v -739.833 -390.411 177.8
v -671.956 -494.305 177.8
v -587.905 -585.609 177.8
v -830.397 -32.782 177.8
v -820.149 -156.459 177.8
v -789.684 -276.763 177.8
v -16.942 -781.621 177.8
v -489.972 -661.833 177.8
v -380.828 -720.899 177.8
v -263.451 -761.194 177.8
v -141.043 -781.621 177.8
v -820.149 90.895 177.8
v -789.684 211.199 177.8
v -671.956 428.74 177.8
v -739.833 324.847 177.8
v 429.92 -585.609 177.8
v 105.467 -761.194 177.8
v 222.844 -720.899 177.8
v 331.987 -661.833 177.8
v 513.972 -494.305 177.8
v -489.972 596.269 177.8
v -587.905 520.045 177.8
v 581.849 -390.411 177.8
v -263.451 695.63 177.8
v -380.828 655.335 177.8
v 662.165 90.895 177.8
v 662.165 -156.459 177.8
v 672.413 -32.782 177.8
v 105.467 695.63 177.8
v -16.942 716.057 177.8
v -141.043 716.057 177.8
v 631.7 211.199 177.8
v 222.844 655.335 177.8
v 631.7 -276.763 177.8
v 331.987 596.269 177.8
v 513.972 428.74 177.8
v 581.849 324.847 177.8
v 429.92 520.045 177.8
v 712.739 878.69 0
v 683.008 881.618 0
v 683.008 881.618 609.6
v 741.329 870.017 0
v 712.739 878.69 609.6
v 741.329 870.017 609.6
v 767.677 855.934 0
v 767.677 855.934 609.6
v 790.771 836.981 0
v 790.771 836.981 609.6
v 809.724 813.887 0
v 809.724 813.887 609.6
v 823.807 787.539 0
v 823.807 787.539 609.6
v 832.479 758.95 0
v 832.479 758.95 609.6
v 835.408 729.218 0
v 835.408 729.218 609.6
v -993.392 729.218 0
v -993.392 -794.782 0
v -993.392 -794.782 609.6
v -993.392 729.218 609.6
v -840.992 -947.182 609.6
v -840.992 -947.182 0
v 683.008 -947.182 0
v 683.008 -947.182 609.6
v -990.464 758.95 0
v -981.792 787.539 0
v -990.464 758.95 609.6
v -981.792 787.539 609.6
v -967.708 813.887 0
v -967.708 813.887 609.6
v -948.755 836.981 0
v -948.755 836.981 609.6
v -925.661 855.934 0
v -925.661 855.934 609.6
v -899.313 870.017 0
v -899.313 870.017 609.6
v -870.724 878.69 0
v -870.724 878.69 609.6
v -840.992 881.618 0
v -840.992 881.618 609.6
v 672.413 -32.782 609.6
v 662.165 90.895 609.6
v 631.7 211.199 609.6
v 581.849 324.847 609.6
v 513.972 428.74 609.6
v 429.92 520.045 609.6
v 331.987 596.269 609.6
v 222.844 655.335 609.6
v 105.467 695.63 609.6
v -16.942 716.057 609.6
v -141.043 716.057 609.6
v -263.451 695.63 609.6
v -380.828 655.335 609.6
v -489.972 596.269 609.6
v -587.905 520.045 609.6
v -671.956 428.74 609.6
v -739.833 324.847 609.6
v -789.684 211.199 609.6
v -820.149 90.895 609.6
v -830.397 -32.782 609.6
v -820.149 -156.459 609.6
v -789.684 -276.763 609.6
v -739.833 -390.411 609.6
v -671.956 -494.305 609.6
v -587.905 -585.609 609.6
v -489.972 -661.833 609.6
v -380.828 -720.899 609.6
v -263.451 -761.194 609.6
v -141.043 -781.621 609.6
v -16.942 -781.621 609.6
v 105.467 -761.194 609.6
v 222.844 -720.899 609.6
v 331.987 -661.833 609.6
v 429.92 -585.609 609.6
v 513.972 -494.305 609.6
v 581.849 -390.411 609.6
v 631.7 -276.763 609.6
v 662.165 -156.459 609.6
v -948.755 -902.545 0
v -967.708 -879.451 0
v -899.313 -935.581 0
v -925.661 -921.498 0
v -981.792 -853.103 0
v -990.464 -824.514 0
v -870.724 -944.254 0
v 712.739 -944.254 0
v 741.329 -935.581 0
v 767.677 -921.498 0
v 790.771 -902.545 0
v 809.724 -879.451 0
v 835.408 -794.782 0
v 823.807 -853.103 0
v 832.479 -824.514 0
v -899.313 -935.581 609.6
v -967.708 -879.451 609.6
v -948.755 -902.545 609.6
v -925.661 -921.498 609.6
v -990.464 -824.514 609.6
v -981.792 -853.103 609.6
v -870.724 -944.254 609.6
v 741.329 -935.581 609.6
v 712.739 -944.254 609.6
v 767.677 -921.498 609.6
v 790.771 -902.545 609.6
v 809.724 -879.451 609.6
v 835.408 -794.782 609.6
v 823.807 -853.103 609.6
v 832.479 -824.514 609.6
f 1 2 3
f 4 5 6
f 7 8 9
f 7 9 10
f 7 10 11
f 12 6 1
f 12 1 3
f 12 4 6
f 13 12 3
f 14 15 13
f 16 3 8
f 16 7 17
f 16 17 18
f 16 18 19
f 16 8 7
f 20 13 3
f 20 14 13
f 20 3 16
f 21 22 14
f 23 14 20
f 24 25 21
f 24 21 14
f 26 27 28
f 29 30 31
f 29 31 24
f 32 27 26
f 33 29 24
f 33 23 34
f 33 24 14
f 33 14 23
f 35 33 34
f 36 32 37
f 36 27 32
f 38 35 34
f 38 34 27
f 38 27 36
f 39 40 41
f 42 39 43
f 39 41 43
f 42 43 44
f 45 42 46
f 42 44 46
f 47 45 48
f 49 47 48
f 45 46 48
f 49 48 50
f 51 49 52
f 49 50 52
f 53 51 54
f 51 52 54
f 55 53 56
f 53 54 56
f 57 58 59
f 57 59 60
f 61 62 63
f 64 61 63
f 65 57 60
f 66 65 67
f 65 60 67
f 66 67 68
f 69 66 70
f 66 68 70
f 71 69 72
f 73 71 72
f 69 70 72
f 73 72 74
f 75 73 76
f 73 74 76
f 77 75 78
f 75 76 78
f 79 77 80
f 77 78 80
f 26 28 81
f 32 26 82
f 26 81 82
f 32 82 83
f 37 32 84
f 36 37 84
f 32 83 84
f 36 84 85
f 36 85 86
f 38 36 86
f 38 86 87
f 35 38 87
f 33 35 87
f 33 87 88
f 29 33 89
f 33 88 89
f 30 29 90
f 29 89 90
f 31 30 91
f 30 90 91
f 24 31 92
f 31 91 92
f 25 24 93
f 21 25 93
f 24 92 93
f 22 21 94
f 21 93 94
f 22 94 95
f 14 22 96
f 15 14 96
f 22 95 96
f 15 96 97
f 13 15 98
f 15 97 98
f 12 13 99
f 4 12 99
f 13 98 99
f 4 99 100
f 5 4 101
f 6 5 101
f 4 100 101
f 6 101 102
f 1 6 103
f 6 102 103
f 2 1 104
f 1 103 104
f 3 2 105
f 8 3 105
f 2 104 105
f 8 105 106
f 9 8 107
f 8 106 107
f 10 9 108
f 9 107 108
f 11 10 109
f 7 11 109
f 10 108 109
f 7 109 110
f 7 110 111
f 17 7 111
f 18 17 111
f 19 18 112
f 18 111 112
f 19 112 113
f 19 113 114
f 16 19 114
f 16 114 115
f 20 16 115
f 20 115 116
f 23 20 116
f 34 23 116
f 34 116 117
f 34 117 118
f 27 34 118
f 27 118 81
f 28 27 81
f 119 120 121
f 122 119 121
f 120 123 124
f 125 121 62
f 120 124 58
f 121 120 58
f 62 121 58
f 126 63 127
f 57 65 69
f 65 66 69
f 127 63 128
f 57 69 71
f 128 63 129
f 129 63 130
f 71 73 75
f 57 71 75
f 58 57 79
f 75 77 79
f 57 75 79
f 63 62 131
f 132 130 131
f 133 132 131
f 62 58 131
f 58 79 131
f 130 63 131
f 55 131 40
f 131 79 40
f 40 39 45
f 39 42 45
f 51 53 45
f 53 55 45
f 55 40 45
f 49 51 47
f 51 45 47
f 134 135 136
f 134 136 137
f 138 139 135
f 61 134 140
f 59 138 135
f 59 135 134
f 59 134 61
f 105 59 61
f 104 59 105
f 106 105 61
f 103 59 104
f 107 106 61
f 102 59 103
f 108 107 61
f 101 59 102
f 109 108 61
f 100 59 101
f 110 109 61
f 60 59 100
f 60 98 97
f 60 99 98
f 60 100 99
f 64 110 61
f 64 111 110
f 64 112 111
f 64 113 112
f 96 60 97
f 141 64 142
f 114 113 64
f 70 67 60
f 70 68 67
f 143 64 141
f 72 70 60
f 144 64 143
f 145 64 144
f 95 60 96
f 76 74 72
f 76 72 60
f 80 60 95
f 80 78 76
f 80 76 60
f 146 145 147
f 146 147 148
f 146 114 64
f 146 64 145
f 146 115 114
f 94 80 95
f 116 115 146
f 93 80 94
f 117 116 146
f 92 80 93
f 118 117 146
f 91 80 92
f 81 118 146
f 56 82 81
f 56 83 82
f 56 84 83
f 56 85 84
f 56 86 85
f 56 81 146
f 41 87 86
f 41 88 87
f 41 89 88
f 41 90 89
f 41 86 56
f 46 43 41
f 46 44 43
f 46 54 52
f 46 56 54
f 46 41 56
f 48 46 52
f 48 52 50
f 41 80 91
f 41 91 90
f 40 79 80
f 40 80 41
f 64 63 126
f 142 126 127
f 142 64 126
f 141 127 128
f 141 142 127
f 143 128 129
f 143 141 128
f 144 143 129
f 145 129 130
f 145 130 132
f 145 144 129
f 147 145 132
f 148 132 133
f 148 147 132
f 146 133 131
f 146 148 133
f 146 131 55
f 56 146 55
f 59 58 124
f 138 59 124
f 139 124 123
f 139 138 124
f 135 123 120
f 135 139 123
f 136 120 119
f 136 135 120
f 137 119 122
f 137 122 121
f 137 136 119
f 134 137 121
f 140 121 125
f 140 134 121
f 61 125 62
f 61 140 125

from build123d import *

# Parameters (mm, degrees)
F0_W     = 1828.8
F0_H     = 1828.8
F1_DEPTH = 609.6
F2_R     = 751.405034
F3_DEPTH = 431.8
F4_R     = 152.4


with BuildPart() as f1:
    # F0 (on Top) → F1 (new body)
    with BuildSketch(Plane.XY):
        with Locations((-78.992321, -32.782064)):
            Rectangle(F0_W, F0_H)
    extrude(amount=F1_DEPTH)

    # F2 (on face) → F3 (cut)
    with BuildSketch(Plane.XY.offset(609.6)):
        with Locations((-78.992321, -32.782064)):
            Circle(F2_R)
    extrude(amount=-F3_DEPTH, mode=Mode.SUBTRACT)

    # F4
    f4_edges = [f1.edges().sort_by_distance(p)[0] for p in [
        (-993.392321, -947.182064, 304.8),
        (835.407679, -947.182064, 304.8),
        (835.407679, 881.617936, 304.8),
        (-993.392321, 881.617936, 304.8),
    ]]
    fillet(f4_edges, radius=F4_R)


solid = f1.part
